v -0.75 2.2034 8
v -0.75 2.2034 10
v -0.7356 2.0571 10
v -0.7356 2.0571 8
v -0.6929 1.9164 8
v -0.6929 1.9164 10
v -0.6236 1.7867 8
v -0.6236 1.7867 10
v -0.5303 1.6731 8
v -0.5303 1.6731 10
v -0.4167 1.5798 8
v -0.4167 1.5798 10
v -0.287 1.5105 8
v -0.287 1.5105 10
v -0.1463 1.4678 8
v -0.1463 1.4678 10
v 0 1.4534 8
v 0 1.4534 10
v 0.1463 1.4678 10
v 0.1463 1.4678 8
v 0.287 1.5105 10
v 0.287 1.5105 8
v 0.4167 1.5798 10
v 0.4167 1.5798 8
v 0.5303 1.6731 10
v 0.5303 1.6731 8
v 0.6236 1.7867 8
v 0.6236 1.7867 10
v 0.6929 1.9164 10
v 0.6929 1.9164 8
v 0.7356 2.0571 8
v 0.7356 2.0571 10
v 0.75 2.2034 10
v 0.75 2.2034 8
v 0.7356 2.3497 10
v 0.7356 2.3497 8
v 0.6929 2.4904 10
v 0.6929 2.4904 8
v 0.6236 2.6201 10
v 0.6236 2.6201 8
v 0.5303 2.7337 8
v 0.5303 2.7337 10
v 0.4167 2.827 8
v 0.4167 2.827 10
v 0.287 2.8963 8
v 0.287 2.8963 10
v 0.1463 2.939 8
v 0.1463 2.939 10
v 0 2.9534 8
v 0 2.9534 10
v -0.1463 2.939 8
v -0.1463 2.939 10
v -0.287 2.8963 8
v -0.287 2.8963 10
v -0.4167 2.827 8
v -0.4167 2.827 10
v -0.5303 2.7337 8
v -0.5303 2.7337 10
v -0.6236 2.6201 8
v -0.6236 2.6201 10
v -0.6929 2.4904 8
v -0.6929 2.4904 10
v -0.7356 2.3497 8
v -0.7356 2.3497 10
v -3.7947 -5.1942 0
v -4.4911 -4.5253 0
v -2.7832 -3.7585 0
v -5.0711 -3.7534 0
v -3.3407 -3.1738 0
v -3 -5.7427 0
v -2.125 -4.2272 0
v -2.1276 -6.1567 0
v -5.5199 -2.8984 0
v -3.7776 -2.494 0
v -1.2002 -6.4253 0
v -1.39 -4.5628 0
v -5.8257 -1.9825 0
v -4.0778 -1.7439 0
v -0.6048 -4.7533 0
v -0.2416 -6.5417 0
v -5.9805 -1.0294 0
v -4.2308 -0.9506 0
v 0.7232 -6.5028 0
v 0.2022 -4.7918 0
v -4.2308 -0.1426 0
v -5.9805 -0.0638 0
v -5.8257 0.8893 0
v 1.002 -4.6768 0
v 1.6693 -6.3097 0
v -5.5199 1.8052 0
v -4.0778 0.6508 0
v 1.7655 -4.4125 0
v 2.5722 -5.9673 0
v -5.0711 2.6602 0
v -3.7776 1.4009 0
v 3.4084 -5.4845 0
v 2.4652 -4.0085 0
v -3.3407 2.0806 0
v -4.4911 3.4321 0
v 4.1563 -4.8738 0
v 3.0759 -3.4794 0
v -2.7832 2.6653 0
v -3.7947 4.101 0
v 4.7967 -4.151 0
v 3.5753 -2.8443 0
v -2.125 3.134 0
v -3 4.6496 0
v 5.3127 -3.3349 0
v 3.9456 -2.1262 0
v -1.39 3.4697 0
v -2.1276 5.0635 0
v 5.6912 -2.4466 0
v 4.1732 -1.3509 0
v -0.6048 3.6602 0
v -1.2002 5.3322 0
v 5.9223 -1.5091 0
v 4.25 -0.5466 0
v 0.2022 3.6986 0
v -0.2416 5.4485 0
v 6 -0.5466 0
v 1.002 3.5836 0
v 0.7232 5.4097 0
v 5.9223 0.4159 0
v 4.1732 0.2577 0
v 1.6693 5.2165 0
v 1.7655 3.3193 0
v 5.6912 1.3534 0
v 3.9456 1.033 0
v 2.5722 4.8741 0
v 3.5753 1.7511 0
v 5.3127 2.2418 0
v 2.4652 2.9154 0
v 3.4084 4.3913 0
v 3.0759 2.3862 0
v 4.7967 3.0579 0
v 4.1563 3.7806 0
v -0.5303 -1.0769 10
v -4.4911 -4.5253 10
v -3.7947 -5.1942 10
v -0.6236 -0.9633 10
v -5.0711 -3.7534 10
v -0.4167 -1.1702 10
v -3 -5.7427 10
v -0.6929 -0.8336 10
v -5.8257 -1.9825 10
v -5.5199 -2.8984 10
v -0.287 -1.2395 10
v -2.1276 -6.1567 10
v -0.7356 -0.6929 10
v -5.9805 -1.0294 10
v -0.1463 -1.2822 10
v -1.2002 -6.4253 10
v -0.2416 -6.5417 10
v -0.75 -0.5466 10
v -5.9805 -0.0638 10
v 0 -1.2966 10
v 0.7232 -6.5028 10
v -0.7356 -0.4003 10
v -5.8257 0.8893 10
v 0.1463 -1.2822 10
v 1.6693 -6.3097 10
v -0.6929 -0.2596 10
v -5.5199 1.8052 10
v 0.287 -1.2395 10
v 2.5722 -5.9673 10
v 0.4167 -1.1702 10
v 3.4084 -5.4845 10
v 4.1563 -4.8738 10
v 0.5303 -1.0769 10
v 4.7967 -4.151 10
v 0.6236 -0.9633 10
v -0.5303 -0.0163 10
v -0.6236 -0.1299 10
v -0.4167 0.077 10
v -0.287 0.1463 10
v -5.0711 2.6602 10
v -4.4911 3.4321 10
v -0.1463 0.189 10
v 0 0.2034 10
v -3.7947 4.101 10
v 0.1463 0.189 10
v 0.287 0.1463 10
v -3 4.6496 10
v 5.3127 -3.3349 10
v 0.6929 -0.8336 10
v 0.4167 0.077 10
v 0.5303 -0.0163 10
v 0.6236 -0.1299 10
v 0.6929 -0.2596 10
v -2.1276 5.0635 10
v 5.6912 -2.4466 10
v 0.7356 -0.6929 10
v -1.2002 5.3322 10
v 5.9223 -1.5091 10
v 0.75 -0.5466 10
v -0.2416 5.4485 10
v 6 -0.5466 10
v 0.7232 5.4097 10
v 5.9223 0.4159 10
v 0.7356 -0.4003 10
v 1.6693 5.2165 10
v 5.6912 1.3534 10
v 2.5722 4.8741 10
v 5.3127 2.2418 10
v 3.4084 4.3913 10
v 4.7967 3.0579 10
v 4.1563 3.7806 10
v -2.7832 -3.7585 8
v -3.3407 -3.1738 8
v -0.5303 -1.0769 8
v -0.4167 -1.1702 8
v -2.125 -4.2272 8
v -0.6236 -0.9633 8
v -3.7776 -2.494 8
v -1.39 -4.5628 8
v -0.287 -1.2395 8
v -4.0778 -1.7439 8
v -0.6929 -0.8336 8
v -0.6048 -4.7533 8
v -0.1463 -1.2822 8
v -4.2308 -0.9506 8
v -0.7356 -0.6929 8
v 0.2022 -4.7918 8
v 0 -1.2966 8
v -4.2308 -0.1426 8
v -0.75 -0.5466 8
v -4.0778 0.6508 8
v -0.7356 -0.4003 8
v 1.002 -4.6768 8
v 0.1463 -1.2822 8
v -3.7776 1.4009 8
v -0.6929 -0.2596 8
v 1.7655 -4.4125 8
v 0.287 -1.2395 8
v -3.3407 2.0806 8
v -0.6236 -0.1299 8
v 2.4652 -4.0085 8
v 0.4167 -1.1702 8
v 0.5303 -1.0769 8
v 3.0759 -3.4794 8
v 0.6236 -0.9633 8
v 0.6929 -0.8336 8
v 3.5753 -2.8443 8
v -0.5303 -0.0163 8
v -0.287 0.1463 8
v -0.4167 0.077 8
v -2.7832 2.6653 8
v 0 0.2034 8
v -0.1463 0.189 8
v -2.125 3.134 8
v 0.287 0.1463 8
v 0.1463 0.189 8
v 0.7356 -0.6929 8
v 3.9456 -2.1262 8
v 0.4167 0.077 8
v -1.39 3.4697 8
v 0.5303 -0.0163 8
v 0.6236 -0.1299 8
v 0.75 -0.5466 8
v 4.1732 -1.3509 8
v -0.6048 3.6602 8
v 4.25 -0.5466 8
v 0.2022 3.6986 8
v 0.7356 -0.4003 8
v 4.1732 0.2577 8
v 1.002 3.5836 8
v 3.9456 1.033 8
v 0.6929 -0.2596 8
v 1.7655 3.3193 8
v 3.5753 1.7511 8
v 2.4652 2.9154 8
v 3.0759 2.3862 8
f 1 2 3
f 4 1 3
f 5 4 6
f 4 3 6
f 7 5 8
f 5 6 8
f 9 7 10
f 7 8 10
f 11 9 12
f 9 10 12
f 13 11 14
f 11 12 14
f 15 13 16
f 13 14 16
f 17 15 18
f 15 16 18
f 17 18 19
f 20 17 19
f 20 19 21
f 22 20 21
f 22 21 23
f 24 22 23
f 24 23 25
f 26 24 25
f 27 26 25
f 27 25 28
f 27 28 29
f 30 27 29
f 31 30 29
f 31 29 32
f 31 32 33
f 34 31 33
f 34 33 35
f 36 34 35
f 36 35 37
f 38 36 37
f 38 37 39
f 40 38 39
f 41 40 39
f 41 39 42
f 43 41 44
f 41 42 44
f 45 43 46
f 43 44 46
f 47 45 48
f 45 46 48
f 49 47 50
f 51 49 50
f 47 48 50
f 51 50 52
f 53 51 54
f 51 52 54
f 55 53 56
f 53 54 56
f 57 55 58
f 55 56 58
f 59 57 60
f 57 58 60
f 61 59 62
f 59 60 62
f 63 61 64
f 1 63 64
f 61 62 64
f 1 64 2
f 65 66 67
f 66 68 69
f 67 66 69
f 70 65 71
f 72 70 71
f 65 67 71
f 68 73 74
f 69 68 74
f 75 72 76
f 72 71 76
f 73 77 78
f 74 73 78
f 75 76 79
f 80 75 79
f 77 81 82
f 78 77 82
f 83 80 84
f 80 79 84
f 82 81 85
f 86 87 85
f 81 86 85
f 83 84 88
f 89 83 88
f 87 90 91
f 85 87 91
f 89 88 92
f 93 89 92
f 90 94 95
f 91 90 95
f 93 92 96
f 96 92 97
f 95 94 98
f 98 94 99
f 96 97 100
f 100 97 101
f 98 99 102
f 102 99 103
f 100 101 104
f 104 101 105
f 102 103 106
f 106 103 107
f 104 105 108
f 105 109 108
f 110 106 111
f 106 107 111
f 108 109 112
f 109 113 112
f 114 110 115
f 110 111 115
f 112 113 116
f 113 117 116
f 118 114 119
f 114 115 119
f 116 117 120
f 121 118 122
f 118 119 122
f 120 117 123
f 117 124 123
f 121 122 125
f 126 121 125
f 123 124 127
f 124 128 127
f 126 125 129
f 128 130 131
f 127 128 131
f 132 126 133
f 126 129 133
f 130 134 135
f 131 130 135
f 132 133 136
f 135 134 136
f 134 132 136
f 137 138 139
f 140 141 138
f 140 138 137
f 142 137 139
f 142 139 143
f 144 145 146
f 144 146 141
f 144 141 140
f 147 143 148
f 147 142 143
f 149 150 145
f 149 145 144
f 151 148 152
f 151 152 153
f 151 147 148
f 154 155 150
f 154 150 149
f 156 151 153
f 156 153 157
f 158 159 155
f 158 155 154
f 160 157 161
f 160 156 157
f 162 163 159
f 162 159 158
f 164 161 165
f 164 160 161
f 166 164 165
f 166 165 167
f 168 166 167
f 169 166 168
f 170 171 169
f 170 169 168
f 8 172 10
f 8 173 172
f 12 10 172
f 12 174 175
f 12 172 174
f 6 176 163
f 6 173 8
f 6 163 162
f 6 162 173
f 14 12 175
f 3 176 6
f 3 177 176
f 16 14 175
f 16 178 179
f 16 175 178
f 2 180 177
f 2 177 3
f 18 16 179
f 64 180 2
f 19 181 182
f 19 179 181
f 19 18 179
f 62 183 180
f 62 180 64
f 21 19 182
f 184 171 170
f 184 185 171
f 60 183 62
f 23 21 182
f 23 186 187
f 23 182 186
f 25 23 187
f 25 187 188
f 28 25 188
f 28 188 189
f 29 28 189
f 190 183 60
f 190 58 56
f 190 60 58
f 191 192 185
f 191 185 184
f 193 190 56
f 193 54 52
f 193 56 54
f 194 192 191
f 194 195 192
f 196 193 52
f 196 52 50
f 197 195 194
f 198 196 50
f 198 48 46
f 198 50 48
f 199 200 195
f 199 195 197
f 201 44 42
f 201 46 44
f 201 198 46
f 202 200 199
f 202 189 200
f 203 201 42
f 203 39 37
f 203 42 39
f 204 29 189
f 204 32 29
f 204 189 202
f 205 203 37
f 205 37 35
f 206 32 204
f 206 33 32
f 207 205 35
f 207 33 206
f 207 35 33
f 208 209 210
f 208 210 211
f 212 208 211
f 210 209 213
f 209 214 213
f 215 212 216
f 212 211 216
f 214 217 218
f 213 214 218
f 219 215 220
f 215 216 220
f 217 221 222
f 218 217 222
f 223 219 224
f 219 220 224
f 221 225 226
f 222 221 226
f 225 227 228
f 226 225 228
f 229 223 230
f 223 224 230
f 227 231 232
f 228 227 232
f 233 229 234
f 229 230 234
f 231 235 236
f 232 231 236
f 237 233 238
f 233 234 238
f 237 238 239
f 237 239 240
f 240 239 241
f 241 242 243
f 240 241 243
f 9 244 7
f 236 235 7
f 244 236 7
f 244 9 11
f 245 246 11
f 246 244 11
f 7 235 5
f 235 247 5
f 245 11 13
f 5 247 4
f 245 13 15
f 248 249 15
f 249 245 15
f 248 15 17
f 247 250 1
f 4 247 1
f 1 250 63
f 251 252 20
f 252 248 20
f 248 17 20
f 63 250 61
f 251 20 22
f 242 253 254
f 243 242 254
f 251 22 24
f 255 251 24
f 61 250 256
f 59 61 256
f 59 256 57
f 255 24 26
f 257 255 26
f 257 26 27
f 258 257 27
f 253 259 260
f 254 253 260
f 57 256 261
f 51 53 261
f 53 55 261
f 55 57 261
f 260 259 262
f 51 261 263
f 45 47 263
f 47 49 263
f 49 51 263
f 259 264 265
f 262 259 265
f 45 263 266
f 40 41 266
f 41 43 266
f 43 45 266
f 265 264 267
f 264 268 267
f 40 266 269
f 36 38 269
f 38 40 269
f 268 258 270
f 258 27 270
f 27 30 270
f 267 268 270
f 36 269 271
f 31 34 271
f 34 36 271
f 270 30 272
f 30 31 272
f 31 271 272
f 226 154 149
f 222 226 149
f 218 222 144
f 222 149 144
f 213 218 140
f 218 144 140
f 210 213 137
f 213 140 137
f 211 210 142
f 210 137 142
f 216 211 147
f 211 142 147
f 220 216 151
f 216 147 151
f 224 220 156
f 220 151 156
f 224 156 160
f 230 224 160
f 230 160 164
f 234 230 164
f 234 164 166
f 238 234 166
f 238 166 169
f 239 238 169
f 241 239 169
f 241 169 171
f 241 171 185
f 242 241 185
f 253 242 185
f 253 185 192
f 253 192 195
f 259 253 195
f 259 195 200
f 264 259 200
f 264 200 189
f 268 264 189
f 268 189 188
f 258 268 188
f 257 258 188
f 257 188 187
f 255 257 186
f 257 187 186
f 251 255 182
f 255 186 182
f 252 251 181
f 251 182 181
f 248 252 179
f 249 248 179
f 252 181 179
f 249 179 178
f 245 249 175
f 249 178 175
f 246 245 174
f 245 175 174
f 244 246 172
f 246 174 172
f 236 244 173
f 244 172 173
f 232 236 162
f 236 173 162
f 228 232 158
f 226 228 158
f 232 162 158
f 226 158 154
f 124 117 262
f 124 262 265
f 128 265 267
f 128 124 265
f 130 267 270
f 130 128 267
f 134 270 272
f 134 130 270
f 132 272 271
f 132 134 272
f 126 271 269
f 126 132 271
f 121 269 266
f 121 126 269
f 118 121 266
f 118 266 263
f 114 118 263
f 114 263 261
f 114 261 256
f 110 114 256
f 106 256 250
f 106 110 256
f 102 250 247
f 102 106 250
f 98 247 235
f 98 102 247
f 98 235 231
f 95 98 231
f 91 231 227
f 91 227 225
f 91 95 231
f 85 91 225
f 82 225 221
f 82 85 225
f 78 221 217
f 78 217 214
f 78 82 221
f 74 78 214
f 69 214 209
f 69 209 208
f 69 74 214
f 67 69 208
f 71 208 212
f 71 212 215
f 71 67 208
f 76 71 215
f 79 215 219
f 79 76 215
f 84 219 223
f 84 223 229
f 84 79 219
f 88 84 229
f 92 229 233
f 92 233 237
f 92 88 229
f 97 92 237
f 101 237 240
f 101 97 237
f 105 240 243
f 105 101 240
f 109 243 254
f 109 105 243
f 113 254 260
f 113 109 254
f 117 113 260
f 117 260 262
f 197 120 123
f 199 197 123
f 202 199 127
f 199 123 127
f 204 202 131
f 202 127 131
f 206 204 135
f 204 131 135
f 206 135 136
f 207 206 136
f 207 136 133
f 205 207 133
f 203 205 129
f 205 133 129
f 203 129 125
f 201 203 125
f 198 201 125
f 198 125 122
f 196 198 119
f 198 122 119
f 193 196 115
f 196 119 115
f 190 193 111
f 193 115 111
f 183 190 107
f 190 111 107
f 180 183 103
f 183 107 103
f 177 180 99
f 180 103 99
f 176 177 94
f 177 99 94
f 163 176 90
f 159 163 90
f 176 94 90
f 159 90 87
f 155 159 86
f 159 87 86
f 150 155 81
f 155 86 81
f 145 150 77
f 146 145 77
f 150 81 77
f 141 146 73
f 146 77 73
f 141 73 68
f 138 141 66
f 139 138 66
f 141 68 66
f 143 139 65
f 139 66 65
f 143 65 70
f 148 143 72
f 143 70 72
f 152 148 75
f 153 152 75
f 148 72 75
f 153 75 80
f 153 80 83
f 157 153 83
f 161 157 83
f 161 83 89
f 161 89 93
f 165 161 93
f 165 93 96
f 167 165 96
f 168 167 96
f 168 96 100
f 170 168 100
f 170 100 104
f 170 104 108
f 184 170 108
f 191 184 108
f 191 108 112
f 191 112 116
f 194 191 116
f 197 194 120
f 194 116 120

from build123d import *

# Parameters (mm, degrees)
F0_R     = 6
F0_R_2   = 4.25
F1_DEPTH = 10
F2_DEPTH = 8
F3_D     = 1.5


with BuildPart() as f1:
    # F0 (on Top) → F1 (new body)
    with BuildSketch(Plane.XY):
        with Locations((0, -0.5465864819)):
            Circle(F0_R)
        with Locations((0, -0.5465864819)):
            Circle(F0_R_2, mode=Mode.SUBTRACT)
        with Locations((0, -0.5465864819)):
            Circle(F0_R_2)
    extrude(amount=F1_DEPTH)

    # F0 (on Top) → F2 (cut)
    with BuildSketch(Plane.XY):
        with Locations((0, -0.5465864819)):
            Circle(F0_R_2)
    extrude(amount=F2_DEPTH, mode=Mode.SUBTRACT)

    # F3 (through all)
    with Locations(Plane(origin=(0, 0, 0), x_dir=(1, 0, 0), z_dir=(0, 0, -1))):
        with Locations((0, 0.5465864819), (0, -2.2034135181)):
            Hole(F3_D / 2)


solid = f1.part
